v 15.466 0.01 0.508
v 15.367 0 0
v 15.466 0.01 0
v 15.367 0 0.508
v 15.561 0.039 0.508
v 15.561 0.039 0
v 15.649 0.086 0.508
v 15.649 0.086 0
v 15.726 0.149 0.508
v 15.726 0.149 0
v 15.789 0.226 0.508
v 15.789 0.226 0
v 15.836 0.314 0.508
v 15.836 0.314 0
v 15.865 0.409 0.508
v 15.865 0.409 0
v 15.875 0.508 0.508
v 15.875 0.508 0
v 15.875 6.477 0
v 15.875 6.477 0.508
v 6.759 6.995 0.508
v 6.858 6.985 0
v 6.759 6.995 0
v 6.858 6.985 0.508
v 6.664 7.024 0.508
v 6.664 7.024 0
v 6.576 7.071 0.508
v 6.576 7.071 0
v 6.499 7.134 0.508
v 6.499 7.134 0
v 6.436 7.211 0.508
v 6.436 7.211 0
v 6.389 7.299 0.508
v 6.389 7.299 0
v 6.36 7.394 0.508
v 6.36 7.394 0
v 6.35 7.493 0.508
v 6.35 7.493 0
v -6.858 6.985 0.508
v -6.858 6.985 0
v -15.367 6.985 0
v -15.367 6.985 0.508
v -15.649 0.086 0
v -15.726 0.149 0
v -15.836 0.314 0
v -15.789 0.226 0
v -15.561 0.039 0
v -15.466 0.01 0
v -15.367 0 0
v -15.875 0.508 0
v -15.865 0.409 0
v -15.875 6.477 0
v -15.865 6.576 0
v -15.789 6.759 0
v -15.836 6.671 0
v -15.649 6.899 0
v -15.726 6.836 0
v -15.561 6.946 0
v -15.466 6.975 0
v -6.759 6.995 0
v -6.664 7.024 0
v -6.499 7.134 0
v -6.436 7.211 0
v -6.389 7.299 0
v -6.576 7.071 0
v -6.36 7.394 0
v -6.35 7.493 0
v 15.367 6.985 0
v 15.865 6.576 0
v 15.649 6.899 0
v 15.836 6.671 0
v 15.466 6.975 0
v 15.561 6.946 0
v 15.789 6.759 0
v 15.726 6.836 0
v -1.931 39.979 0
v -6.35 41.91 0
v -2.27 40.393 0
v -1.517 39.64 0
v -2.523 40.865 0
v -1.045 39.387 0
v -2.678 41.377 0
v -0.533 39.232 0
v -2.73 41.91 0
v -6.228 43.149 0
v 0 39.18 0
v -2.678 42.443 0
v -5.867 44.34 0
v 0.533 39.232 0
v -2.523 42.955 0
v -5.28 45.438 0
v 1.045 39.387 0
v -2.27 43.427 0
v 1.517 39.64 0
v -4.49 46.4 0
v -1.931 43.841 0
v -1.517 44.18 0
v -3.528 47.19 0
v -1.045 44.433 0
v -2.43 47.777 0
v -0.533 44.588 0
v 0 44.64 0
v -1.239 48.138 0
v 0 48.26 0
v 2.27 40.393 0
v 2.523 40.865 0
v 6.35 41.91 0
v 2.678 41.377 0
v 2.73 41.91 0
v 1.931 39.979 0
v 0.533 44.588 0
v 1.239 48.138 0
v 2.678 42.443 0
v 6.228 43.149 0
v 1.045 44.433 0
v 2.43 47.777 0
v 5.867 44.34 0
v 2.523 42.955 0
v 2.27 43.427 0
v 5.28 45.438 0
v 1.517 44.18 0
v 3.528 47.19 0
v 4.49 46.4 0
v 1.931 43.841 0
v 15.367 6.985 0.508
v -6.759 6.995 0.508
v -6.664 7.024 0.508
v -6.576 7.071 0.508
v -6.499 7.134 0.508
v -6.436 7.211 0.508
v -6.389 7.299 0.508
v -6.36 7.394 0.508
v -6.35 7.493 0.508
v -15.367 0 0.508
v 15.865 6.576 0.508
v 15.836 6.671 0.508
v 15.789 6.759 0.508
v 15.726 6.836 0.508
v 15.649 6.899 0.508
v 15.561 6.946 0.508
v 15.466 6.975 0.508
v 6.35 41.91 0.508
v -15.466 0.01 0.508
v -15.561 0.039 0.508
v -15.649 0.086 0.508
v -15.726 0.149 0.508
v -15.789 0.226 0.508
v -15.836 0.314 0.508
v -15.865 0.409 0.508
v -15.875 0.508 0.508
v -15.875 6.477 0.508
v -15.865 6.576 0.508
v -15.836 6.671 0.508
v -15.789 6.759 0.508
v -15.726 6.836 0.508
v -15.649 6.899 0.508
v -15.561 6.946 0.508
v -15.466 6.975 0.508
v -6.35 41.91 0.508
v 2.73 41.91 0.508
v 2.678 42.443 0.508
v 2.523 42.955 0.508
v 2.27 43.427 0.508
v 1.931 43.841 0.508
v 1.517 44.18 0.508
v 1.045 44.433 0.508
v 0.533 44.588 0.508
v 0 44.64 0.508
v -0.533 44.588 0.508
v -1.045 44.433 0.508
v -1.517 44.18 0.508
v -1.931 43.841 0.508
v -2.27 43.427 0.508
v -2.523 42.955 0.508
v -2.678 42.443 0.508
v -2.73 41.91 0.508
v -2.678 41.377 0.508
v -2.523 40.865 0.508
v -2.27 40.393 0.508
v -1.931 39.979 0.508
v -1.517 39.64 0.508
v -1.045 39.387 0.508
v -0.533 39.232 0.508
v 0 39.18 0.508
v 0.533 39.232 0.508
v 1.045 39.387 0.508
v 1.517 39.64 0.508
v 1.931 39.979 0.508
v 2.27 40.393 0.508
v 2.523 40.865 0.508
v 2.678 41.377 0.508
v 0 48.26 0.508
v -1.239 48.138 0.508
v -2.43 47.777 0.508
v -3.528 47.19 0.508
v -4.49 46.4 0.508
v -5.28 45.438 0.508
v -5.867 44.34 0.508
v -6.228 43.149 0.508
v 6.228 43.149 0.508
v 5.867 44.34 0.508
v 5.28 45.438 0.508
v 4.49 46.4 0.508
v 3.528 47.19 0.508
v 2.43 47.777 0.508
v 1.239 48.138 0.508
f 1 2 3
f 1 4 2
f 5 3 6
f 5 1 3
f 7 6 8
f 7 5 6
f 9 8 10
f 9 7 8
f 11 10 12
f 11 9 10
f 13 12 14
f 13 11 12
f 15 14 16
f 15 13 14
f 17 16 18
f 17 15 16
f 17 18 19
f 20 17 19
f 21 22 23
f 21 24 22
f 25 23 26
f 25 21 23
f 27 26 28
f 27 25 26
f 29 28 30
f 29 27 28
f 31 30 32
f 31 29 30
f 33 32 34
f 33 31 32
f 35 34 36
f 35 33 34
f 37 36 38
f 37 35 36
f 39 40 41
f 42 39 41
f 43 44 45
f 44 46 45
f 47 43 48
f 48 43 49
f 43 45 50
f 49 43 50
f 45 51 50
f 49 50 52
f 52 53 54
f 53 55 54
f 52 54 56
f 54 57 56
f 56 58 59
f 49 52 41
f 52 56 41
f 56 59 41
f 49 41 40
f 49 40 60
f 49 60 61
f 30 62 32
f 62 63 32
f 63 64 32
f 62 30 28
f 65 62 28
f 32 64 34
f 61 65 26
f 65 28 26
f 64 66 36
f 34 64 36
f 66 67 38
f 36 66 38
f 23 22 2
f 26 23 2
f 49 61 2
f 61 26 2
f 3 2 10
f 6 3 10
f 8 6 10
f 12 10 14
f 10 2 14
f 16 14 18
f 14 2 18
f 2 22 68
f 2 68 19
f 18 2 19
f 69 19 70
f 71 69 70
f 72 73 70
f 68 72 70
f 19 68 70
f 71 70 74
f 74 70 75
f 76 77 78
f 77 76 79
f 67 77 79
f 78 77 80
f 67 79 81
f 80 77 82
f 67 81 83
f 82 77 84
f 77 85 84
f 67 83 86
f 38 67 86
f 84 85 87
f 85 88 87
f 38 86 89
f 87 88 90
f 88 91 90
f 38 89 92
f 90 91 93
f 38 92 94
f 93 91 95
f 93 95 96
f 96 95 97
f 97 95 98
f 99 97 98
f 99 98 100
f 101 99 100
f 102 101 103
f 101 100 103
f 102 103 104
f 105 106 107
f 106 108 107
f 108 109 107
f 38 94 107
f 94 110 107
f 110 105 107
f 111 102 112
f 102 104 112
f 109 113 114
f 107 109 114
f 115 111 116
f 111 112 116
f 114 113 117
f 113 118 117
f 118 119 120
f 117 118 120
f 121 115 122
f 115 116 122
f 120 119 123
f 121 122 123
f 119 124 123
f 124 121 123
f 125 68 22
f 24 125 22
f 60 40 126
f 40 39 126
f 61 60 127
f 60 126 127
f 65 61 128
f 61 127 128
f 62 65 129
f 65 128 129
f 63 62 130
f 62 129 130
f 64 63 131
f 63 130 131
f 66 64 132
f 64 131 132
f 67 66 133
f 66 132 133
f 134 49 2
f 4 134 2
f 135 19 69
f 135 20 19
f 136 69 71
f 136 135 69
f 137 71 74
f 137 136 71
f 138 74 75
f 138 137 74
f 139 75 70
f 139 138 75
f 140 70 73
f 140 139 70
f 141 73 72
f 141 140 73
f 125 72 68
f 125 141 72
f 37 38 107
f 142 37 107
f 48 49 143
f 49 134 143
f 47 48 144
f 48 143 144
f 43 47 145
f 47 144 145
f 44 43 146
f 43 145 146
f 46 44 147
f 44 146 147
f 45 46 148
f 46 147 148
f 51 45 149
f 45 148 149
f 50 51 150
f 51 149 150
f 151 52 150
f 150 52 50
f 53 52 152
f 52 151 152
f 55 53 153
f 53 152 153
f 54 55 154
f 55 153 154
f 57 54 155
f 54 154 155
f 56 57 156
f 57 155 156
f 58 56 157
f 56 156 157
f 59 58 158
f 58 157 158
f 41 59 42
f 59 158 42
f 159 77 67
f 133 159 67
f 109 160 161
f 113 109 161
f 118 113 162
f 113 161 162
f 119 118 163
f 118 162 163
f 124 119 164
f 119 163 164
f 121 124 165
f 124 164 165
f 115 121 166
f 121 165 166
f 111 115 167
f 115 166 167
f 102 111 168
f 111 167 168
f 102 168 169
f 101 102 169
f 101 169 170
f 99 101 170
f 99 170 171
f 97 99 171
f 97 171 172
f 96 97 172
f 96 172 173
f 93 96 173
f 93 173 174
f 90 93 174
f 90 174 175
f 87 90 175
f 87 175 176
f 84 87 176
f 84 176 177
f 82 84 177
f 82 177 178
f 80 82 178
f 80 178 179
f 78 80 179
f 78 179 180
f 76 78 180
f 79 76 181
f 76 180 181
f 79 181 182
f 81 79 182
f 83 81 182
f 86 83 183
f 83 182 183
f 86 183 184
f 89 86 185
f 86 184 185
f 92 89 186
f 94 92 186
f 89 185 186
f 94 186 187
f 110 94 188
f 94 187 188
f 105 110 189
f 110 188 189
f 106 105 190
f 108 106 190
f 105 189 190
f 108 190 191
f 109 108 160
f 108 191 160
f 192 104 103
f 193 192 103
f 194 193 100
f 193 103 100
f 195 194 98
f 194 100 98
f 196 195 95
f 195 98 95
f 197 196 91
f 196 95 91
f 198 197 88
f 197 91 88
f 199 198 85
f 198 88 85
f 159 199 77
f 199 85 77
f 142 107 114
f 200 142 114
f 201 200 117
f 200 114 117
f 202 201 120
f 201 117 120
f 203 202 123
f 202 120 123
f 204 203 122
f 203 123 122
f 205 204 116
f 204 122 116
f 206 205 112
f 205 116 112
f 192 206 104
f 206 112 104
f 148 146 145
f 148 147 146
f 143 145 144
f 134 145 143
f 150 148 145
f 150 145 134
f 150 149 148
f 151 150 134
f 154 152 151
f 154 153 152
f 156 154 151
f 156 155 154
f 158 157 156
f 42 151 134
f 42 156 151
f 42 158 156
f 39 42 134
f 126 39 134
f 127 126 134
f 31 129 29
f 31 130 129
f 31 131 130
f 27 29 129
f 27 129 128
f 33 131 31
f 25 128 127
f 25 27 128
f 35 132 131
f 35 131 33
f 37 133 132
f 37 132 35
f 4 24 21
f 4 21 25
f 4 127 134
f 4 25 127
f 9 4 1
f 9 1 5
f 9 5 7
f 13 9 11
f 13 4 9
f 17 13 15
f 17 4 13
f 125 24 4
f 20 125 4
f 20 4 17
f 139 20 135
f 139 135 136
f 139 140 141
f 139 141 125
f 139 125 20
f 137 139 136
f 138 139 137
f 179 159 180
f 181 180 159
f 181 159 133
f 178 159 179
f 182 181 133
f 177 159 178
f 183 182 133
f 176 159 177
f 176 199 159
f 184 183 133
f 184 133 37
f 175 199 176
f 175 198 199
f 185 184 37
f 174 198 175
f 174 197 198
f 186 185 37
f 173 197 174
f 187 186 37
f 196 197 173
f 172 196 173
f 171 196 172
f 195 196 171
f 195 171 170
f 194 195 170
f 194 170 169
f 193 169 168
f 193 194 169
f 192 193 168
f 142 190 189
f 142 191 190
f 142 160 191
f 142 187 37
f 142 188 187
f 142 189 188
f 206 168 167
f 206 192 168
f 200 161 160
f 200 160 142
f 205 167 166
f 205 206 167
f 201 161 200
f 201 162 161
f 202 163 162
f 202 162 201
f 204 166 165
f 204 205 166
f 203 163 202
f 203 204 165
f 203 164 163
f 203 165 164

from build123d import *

# Parameters (mm, degrees)
F1_DEPTH = 0.508
F2_R     = 2.7305
F3_DEPTH = 0.509
F4_R     = 0.508


with BuildPart() as f1:
    # F0 (on Top) → F1 (new body)
    with BuildSketch(Plane.XY):
        with BuildLine():
            Line((-15.875, 0), (0, 0))
            Line((0, 0), (15.875, 0))
            Line((15.875, 0), (15.875, 6.985))
            Line((15.875, 6.985), (6.35, 6.985))
            Line((6.35, 6.985), (6.35, 41.91))
            ThreePointArc((6.35, 41.91), (4.490128, 46.400128), (0, 48.26))
            ThreePointArc((0, 48.26), (-4.490128, 46.400128), (-6.35, 41.91))
            Line((-6.35, 41.91), (-6.35, 6.985))
            Line((-6.35, 6.985), (-15.875, 6.985))
            Line((-15.875, 6.985), (-15.875, 0))
        make_face()
    extrude(amount=F1_DEPTH)

    # F2 (on face) → F3 (cut, through all)
    with BuildSketch(Plane.XY.offset(0.508)):
        with Locations((0, 41.91)):
            Circle(F2_R)
    extrude(amount=-F3_DEPTH, mode=Mode.SUBTRACT)

    # F4
    f4_edges = [f1.edges().sort_by_distance(p)[0] for p in [
        (-15.875, 0, 0.254),
        (-15.875, 6.985, 0.254),
        (15.875, 6.985, 0.254),
        (15.875, 0, 0.254),
        (6.35, 6.985, 0.254),
        (-6.35, 6.985, 0.254),
    ]]
    fillet(f4_edges, radius=F4_R)


solid = f1.part
